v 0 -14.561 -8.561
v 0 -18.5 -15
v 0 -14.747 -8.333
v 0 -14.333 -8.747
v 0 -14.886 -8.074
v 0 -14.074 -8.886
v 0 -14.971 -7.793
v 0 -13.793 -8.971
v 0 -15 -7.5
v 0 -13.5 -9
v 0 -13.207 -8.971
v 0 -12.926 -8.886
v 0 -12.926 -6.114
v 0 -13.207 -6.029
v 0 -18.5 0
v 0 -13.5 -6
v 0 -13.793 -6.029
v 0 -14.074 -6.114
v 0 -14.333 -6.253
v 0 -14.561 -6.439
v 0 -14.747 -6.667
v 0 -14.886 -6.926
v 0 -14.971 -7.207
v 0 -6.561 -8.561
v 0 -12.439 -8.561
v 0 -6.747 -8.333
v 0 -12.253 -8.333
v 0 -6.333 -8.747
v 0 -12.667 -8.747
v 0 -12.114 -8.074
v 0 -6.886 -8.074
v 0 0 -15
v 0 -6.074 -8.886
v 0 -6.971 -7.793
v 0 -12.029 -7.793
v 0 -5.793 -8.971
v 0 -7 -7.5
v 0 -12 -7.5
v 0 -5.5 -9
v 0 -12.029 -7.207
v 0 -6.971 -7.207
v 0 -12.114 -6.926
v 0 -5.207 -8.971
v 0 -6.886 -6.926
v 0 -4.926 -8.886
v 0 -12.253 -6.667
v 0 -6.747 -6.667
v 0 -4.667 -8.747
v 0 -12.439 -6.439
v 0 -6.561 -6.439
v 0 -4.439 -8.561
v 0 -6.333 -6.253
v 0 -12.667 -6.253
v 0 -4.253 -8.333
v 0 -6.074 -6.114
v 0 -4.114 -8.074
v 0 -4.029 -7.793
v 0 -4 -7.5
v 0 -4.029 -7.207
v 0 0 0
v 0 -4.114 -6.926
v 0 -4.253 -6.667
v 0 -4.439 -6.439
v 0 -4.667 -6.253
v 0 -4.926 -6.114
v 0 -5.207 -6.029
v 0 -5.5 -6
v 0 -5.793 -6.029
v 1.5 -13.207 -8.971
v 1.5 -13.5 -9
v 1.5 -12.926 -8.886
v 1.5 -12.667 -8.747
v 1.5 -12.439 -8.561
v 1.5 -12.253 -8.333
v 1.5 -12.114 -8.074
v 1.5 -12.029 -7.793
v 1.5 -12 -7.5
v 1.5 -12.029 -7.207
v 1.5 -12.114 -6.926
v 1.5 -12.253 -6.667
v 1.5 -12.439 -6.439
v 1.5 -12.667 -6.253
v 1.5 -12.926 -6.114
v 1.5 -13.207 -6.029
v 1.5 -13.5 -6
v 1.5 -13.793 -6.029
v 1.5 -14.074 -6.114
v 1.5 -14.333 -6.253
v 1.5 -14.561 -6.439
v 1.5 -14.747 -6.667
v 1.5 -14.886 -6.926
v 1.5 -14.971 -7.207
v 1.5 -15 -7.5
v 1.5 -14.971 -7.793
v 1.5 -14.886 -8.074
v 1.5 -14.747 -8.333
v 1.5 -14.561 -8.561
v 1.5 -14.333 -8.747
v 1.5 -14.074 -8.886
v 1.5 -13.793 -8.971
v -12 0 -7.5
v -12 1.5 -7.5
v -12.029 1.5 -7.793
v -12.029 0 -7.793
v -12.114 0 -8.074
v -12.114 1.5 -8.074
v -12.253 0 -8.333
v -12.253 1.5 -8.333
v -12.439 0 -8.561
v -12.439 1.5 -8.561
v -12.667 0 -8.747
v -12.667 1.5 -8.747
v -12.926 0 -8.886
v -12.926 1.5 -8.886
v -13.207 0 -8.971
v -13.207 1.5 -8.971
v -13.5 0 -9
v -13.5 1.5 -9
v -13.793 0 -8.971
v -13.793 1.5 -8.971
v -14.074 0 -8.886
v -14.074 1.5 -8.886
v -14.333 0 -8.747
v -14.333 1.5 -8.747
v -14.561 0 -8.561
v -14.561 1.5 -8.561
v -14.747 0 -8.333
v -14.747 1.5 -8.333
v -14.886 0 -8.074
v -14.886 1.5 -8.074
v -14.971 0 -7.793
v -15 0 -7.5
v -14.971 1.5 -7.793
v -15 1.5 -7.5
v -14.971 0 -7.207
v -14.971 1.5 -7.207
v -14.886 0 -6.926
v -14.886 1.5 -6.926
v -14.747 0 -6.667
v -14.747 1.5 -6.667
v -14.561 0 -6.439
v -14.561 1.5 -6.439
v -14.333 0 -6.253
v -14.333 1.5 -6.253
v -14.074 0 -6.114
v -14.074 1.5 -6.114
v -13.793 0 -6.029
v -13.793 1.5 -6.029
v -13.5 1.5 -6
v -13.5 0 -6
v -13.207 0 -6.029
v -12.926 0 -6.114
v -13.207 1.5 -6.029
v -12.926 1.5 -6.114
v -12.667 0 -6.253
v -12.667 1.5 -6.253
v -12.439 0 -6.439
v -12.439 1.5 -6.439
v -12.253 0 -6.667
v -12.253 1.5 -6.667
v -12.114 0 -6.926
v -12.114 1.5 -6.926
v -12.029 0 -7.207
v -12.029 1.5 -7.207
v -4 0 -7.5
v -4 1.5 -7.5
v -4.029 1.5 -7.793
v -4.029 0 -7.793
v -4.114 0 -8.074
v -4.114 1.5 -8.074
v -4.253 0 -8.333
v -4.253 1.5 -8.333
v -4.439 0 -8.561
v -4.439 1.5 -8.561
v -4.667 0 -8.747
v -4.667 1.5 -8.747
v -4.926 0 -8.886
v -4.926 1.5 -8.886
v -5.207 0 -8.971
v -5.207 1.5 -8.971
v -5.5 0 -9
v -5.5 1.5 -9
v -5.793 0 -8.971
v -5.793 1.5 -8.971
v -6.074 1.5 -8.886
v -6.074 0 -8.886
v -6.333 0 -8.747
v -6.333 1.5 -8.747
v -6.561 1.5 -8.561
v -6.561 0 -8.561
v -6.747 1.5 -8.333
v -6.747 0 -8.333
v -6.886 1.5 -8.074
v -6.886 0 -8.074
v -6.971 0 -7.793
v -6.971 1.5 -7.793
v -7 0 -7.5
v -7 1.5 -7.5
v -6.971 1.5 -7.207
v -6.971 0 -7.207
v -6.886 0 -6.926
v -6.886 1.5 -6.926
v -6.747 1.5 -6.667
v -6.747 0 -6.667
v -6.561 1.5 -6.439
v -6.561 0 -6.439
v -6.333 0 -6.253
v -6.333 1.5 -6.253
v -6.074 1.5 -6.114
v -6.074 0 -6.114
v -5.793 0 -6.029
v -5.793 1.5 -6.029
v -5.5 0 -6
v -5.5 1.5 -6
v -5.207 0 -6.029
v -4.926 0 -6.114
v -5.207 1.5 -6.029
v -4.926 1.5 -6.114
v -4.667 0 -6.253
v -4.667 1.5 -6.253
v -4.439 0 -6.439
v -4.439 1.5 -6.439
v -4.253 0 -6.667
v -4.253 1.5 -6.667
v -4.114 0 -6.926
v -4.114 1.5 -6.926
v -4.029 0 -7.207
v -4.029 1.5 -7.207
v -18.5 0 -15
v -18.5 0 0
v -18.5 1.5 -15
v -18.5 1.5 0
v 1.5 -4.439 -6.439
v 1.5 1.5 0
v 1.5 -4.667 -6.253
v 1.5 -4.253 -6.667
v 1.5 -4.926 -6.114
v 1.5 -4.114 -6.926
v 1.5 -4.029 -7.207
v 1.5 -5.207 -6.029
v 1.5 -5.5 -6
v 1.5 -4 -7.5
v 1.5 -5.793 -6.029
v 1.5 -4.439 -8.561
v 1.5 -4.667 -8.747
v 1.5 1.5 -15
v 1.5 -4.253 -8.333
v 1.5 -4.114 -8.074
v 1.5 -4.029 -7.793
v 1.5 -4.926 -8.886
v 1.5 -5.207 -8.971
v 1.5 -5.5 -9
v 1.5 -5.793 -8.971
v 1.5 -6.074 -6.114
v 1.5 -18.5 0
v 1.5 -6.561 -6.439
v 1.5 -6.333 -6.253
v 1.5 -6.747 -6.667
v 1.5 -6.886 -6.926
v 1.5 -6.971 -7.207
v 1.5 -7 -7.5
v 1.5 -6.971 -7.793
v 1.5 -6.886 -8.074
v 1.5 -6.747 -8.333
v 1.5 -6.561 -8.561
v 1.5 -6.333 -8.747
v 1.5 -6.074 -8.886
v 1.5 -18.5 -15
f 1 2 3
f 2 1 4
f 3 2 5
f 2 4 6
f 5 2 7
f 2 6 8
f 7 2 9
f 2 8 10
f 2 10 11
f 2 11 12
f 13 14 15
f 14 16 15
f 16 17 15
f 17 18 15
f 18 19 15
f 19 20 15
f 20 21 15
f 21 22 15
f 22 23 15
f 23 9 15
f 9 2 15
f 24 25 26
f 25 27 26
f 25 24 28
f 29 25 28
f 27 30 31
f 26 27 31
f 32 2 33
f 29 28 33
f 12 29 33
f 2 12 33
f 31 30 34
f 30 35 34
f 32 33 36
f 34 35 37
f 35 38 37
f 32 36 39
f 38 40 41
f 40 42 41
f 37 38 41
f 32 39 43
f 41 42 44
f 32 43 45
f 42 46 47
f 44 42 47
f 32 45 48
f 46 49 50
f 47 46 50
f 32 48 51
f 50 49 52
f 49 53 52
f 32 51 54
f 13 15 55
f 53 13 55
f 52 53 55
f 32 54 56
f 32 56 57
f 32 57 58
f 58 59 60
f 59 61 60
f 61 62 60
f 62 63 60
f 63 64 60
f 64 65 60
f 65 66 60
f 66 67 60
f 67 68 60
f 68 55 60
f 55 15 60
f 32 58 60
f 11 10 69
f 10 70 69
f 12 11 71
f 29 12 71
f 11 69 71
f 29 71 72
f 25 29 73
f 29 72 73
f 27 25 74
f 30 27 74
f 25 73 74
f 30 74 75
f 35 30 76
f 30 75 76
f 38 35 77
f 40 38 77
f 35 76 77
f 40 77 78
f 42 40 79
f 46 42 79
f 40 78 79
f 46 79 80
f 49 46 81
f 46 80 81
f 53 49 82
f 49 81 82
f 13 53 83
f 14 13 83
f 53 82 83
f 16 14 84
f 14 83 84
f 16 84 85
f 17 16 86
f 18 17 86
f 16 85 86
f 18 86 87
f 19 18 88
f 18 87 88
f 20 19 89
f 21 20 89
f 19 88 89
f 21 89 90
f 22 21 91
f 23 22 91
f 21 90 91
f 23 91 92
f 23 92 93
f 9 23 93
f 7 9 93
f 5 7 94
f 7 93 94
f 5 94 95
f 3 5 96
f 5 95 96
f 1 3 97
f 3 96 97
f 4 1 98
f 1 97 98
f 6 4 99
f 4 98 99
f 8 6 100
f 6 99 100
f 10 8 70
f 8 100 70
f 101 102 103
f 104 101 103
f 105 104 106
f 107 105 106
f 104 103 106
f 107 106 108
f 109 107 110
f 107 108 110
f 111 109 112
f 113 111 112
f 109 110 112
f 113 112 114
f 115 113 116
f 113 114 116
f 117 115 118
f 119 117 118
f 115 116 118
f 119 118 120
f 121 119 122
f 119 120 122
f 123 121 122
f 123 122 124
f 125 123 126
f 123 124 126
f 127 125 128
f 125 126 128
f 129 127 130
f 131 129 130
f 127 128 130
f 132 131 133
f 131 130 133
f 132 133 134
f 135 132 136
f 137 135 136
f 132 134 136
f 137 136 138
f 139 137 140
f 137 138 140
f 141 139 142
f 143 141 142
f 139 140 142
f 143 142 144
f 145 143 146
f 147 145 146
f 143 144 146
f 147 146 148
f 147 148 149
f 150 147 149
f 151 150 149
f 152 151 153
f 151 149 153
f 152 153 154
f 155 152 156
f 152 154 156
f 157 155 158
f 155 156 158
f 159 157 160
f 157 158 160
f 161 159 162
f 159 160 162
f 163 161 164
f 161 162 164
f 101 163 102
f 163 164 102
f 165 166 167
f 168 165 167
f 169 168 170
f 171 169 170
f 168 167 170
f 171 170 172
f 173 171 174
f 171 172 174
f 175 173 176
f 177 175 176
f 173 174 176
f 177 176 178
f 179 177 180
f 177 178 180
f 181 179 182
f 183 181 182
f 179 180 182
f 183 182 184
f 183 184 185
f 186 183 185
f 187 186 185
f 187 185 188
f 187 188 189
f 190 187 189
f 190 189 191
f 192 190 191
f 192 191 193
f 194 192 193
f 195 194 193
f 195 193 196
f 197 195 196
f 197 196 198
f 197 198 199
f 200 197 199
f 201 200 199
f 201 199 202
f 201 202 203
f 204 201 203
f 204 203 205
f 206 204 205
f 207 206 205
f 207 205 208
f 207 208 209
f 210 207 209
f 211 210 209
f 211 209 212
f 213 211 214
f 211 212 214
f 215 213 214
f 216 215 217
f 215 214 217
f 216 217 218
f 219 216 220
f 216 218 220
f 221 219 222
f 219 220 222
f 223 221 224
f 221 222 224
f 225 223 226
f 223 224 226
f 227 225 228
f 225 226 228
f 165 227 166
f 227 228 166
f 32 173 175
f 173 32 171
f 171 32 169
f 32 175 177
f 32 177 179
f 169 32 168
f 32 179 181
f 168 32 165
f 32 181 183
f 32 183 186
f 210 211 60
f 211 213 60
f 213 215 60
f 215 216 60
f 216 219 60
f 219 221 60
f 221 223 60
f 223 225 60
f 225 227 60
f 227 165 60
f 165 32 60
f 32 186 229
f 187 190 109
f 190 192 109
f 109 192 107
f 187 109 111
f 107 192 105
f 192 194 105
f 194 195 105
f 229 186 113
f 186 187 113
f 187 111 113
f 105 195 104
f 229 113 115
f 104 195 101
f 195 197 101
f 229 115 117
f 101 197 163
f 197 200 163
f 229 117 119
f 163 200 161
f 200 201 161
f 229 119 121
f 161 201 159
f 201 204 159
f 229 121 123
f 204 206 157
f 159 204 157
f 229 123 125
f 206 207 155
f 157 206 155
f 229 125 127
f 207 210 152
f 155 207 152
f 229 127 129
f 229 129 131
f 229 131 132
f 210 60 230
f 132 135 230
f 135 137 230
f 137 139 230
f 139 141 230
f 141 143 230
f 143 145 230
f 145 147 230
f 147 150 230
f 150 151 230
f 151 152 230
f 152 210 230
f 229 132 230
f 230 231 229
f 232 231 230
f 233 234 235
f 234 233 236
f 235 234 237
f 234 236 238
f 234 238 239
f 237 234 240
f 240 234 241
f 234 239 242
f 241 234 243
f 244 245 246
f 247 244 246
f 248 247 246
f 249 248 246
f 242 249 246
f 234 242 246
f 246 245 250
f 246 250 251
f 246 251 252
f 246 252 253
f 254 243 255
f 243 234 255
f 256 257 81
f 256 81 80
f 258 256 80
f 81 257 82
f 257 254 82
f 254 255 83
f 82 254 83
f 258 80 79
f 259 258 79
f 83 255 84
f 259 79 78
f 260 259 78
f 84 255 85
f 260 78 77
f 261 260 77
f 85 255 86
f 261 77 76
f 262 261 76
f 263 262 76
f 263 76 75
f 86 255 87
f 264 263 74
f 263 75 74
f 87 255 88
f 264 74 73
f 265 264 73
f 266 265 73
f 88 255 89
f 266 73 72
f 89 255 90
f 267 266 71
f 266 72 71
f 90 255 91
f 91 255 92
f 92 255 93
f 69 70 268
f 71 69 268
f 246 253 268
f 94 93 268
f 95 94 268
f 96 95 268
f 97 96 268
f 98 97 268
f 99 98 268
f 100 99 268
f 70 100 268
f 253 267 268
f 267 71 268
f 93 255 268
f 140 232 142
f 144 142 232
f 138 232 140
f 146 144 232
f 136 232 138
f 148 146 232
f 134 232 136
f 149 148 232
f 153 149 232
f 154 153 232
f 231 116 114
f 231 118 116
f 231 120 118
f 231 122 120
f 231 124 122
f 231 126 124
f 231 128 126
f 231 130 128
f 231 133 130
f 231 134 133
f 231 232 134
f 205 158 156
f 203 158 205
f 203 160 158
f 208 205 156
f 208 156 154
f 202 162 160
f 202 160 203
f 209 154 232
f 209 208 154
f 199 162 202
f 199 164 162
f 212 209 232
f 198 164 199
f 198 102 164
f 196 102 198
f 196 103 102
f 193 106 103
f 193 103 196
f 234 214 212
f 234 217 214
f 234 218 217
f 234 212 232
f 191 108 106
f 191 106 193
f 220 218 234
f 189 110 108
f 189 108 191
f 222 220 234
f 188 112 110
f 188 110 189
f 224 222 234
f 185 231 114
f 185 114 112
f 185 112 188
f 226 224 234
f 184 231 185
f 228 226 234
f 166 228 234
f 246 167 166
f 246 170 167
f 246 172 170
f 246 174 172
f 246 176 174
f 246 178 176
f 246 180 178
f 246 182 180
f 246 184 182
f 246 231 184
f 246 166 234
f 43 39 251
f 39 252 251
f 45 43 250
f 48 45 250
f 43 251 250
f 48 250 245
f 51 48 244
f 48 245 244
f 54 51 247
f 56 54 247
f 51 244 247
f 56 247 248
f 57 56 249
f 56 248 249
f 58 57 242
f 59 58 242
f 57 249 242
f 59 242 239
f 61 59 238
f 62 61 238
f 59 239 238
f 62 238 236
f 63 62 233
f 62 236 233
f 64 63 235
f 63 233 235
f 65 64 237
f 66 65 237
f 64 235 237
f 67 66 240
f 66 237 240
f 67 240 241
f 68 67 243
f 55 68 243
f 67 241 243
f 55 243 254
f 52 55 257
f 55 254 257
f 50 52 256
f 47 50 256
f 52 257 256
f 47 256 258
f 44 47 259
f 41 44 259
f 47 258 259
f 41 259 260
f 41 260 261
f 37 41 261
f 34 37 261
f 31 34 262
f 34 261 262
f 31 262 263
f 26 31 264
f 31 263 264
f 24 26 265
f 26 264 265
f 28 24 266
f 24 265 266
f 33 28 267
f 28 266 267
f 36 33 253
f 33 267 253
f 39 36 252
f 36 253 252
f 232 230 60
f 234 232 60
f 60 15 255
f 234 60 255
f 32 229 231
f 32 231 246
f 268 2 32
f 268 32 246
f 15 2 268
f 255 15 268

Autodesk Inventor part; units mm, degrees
ref_plane "YZ Plane" through (0, 0, 0) normal (1, 0, 0) x (0, 1, 0)
ref_plane "XZ Plane" through (0, 0, 0) normal (0, 1, 0) x (-1, 0, 0)
ref_plane "XY Plane" through (0, 0, 0) normal (0, 0, 1) x (1, 0, 0)
sketch "スケッチ1" plane through (0, 0, 0) normal (0, 1, 0) x (-1, 0, 0)
  line L0 (0, 0) -> (20, 0)
  line L1 (20, 0) -> (20, -15)
  line L2 (20, -15) -> (0, -15)
  line L3 (0, -15) -> (0, 0)
  dimension "d0" = 20
  dimension "d1" = 15
sketch "スケッチ2" plane through (0, 0, 0) normal (1, 0, 0) x (0, 1, 0)
  line L0 (0, 0) -> (-20, 0)
  line L1 (-20, 0) -> (-20, -15)
  line L2 (-20, -15) -> (0, -15)
  line L3 (0, -15) -> (0, 0)
  dimension "d2" = 20
  dimension "d3" = 15
extrude "押し出し1" add sketch "スケッチ1" along normal blind 1.5
extrude "押し出し2" add sketch "スケッチ2" along normal blind 1.5
sketch "スケッチ3" plane through (0, 0, 0) normal (0, 1, 0) x (1, 0, 0)
  line L0 (0, 15) -> (1.5, 15) projected
  line L1 (0, 0) -> (0, 15) projected
  line L2 (1.5, 15) -> (0, 15)
  line L3 (0, 15) -> (0, 0)
  line L4 (0, 0) -> (1.5, 0)
  line L5 (1.5, 0) -> (1.5, 15)
extrude "押し出し3" add sketch "スケッチ3" along normal blind 1.5
sketch "スケッチ4" plane through (1.5, 0, 0) normal (1, 0, 0) x (0, 0, -1)
  point P0 (0, 0)
sketch "スケッチ5" plane through (1.5, 0, 0) normal (1, 0, 0) x (0, 0, -1)
  point P0 (0, 0)
sketch "スケッチ6" plane through (-20, 0, -15) normal (-1, 0, 0) x (0, 0, 1)
  point P0 (15, 0)
sketch "スケッチ7" plane through (-20, 0, -15) normal (-1, 0, 0) x (0, 0, 1)
  line L0 (15.9074, 4.1741) -> (-1.7689, 4.1741)
  line L1 (-1.7689, 4.1741) -> (-1.7689, -3.4482)
  line L2 (-1.7689, -3.4482) -> (15.9074, -3.4482)
  line L3 (15.9074, -3.4482) -> (15.9074, 4.1741)
  point P0 (15, 0)
extrude "押し出し4" cut sketch "スケッチ7" against normal blind 1.5
sketch "スケッチ8" plane through (0, -20, -15) normal (0, -1, 0) x (1, 0, 0)
  line L0 (-2.0326, 16.6333) -> (6.4245, 16.6333)
  line L1 (6.4245, 16.6333) -> (6.4245, -1.5875)
  line L2 (6.4245, -1.5875) -> (-2.0326, -1.5875)
  line L3 (-2.0326, -1.5875) -> (-2.0326, 16.6333)
  point P0 (0, 15)
extrude "押し出し5" cut sketch "スケッチ8" against normal blind 1.5
sketch "スケッチ9" plane through (0, 1.5, 0) normal (0, 1, 0) x (1, 0, 0)
  circle A0 centre (-13.5, 7.5) radius 1.5
  circle A1 centre (-5.5, 7.5) radius 1.5
  point P0 (0, 0)
  dimension "d14" = 3
  dimension "d15" = 3
sketch "スケッチ10" plane through (1.5, 0, 0) normal (1, 0, 0) x (0, 0, -1)
  circle A0 centre (7.5, -5.5) radius 1.5
  circle A1 centre (7.5, -13.5) radius 1.5
  point P0 (0, 0)
  dimension "d16" = 3
  dimension "d18" = 3
extrude "押し出し6" cut sketch "スケッチ10" against normal blind 1.5
extrude "押し出し7" cut sketch "スケッチ9" against normal blind 1.5
properties part number "二つ分け角柱"
